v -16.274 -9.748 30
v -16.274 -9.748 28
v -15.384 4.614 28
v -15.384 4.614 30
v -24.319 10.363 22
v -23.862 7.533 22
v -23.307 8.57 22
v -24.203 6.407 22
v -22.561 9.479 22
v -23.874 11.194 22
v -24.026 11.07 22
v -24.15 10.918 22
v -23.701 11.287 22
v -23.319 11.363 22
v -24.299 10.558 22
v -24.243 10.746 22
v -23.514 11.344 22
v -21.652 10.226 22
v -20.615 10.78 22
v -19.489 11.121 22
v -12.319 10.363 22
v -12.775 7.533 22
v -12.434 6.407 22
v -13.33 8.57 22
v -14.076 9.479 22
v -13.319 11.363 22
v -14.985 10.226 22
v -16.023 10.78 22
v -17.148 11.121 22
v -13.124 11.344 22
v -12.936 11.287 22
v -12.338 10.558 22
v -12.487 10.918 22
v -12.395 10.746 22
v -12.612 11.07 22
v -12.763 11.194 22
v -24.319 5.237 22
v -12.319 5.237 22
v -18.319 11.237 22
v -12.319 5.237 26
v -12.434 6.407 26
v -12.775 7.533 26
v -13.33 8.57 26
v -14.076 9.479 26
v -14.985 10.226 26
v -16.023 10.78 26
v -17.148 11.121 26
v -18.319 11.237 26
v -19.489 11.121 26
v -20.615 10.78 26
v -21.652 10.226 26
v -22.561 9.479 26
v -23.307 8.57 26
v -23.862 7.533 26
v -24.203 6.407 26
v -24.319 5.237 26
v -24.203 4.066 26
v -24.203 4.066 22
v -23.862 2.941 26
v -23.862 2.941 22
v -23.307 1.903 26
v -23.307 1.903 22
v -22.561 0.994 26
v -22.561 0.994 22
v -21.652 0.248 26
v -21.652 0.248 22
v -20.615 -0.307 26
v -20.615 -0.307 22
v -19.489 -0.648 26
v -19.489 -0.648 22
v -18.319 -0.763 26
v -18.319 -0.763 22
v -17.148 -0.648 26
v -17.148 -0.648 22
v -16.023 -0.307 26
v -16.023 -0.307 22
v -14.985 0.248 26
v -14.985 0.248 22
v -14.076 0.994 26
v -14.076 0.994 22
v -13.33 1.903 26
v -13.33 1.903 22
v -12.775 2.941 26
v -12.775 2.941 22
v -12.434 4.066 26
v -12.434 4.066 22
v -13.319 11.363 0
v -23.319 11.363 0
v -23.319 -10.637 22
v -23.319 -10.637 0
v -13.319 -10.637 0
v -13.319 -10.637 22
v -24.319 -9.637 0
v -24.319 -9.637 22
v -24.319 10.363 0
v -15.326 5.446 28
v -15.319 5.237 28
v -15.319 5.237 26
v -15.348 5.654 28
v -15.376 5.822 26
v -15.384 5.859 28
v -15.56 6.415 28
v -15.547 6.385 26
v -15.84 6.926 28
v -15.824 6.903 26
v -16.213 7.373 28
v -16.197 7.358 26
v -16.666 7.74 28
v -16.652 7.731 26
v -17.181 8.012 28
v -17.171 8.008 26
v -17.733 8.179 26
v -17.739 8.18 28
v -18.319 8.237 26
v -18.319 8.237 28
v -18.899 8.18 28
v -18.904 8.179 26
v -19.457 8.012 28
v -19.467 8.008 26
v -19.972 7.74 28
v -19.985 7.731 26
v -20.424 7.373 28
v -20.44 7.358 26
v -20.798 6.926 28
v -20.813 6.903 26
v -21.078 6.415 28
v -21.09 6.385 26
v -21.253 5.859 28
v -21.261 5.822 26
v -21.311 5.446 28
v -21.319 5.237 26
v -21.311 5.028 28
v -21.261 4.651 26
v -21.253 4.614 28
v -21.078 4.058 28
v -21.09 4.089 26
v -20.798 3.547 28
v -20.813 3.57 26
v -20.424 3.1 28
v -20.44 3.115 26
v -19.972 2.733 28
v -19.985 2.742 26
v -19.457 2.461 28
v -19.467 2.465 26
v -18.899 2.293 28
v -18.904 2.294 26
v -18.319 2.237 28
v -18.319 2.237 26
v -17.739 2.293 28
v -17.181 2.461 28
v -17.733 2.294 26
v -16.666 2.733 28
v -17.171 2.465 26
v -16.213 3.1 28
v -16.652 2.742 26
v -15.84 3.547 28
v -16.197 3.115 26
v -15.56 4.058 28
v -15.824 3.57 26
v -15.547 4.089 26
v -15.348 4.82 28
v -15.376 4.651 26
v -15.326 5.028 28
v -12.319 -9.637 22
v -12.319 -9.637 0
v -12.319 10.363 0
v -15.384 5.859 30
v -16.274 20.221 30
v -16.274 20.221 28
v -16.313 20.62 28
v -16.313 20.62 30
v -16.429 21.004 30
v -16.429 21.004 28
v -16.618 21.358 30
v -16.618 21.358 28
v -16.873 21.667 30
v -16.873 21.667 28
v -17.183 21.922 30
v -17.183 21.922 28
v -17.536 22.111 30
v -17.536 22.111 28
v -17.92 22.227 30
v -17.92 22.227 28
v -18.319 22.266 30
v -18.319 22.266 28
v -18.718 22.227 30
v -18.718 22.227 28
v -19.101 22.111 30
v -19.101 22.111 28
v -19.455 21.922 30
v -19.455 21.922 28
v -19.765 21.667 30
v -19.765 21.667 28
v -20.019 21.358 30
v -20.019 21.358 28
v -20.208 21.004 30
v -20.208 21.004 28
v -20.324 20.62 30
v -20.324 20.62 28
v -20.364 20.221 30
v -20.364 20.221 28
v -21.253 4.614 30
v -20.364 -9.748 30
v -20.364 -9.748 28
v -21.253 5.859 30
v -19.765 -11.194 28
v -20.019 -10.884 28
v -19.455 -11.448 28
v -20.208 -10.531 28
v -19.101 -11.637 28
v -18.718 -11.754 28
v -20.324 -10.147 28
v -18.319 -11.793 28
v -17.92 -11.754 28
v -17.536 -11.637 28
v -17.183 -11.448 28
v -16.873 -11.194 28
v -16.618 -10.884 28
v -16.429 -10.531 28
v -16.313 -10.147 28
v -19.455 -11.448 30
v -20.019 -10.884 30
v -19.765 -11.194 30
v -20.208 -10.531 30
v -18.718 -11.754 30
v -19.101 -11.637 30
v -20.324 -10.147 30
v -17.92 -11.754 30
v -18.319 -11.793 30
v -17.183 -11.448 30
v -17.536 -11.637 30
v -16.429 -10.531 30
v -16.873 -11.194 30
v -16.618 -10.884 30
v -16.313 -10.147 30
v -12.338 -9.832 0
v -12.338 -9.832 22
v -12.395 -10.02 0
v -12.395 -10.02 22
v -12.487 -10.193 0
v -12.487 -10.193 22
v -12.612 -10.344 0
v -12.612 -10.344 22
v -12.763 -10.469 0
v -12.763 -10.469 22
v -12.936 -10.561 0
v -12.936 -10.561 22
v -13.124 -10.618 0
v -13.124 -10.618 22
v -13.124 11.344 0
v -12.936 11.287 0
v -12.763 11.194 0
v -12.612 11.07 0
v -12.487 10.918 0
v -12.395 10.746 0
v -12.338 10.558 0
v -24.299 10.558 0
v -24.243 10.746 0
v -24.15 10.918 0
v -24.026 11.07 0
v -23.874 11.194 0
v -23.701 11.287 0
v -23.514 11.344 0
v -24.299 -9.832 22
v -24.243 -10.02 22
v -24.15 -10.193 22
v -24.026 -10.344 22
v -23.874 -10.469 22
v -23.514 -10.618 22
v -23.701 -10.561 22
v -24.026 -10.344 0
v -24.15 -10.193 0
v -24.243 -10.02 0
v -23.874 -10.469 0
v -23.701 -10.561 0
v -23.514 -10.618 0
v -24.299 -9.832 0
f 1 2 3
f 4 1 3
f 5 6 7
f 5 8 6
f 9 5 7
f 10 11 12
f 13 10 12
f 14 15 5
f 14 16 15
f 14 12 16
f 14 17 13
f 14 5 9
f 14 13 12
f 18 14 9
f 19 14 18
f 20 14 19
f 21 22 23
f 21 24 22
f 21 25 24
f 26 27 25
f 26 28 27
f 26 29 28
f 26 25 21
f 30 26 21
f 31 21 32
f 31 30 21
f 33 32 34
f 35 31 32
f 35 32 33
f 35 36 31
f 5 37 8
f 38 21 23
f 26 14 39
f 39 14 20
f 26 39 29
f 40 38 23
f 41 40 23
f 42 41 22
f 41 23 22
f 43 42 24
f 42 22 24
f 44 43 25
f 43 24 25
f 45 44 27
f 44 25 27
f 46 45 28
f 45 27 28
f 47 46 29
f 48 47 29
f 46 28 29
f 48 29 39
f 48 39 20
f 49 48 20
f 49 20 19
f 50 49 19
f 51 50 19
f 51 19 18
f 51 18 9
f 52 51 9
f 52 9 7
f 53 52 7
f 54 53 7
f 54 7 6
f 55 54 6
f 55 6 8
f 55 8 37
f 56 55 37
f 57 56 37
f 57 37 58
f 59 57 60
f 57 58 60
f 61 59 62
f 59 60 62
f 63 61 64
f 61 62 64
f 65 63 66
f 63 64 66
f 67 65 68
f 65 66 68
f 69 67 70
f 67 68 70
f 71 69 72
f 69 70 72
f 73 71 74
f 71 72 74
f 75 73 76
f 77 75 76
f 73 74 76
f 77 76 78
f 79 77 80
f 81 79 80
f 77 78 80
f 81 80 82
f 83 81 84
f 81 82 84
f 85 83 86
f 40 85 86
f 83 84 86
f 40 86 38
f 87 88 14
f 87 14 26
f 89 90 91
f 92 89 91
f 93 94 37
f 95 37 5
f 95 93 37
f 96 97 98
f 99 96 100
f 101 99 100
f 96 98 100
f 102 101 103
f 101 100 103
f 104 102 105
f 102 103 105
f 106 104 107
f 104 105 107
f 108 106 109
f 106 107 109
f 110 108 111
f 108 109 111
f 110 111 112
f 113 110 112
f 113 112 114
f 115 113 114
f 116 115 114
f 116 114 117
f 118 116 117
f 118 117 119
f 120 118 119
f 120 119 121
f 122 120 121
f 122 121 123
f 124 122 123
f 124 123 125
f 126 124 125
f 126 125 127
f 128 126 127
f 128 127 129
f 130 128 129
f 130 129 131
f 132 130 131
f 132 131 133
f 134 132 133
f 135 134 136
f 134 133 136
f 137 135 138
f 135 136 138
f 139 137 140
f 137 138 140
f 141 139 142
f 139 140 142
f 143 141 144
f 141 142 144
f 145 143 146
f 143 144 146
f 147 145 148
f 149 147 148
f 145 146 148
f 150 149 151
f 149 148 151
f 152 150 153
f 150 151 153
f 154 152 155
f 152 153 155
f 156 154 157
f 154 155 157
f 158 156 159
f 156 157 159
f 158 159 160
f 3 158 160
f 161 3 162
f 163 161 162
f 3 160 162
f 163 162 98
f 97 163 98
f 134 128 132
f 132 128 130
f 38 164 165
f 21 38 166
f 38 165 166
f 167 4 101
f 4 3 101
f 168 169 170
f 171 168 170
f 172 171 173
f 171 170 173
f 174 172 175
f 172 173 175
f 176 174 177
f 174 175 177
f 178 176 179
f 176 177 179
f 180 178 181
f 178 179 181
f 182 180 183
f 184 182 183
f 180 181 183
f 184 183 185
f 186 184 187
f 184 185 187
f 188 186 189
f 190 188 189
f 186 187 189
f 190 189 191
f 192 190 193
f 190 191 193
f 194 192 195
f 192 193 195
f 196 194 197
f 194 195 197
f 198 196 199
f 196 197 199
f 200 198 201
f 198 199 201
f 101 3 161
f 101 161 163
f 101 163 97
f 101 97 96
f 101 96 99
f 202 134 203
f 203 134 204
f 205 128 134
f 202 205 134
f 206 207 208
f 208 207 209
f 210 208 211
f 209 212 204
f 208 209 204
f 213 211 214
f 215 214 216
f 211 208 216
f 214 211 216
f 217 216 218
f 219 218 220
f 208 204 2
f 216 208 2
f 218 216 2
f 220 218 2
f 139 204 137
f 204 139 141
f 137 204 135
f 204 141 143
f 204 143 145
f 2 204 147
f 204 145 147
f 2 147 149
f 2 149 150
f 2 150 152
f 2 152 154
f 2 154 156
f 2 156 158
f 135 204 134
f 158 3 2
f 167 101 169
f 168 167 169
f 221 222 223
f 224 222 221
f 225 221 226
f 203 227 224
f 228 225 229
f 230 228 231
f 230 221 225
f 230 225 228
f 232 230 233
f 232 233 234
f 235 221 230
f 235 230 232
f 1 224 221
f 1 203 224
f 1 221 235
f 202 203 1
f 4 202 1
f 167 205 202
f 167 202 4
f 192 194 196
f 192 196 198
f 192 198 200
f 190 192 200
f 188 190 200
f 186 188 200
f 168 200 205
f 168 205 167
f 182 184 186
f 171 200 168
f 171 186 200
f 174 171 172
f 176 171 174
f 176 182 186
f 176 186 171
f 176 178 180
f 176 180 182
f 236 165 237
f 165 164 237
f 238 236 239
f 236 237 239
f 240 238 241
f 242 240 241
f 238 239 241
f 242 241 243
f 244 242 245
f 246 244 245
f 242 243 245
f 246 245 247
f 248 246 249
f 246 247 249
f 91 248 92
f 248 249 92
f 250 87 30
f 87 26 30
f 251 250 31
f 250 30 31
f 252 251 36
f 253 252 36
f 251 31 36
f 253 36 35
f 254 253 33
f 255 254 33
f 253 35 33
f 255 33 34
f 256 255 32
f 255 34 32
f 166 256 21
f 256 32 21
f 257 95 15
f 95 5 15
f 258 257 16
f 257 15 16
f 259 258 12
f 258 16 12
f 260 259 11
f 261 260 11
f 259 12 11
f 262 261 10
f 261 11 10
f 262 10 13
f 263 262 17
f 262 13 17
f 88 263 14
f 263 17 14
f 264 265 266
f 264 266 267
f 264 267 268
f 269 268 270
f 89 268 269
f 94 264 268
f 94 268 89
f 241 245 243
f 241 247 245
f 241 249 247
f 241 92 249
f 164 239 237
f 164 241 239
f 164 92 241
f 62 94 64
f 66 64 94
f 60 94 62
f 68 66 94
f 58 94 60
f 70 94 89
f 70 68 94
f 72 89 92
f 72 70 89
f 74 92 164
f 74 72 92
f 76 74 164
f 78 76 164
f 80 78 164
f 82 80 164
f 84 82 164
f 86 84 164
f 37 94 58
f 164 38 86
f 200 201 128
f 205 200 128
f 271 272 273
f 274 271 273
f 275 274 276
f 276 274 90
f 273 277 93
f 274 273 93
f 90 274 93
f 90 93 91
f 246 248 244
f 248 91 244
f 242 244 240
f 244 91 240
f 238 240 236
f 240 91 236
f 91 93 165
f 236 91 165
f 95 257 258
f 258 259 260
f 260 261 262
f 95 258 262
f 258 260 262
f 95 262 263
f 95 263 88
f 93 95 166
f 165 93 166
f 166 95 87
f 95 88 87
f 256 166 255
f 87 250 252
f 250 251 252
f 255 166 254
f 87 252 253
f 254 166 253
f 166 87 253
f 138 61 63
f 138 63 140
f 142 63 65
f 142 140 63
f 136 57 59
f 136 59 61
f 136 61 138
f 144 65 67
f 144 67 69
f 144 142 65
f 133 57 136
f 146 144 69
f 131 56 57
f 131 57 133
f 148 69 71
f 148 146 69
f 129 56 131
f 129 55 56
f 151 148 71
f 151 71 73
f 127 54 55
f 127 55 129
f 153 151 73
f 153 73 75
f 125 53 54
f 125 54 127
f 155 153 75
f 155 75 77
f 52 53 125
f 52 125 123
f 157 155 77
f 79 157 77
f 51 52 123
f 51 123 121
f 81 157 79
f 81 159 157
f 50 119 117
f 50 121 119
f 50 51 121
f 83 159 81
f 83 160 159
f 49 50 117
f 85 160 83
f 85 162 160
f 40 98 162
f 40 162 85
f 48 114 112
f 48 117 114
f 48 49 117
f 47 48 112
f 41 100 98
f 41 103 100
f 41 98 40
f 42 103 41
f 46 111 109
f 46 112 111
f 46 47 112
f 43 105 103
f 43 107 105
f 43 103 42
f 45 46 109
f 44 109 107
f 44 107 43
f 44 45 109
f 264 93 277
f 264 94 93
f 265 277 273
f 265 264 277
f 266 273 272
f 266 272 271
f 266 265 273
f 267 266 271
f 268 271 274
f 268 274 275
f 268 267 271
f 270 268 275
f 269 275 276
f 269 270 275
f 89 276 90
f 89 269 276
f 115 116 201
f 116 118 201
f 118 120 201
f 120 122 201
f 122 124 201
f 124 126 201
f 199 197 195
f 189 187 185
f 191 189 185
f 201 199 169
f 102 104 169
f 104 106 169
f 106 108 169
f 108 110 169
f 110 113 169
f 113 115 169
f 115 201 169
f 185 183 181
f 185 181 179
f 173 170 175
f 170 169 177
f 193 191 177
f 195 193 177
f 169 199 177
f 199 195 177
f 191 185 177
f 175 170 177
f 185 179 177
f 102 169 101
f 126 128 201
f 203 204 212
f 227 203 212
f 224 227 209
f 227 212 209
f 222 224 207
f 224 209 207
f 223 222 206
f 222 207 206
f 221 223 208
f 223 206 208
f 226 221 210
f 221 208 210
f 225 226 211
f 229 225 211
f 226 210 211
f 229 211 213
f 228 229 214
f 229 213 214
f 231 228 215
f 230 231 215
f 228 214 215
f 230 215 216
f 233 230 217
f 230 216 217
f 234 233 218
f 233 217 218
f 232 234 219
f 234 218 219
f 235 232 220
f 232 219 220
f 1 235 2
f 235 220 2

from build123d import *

# Parameters (mm, degrees)
F0_W     = 12
F0_H     = 22
F1_DEPTH = 22
F3_DEPTH = 4
F4_R     = 3
F5_DEPTH = 2
F7_DEPTH = 2
F8_R     = 1


with BuildPart() as f1:
    # F0 (on Top) → F1 (new body)
    with BuildSketch(Plane.XY):
        with Locations((-18.318631, 0.362903)):
            Rectangle(F0_W, F0_H)
    extrude(amount=F1_DEPTH)

    # F2 (on face) → F3 (join)
    with BuildSketch(Plane.XY.offset(22)):
        with BuildLine():
            ThreePointArc((-24.318631, 5.236689), (-18.318631, -0.763311), (-12.318631, 5.236689))
            ThreePointArc((-12.318631, 5.236689), (-18.318631, 11.236689), (-24.318631, 5.236689))
        make_face()
    extrude(amount=F3_DEPTH)

    # F4 (on face) → F5 (join)
    with BuildSketch(Plane.XY.offset(26)):
        with Locations((-18.318631, 5.236689)):
            Circle(F4_R)
    extrude(amount=F5_DEPTH)

    # F6 (on face) → F7 (join)
    with BuildSketch(Plane.XY.offset(28)):
        with BuildLine():
            Line((-18.318631, 20.221412), (-16.273675, 20.221412))
            ThreePointArc((-16.273675, 20.221412), (-18.318631, 22.266367), (-20.363586, 20.221412))
            Line((-20.363586, 20.221412), (-18.318631, 20.221412))
        make_face()
        with BuildLine():
            Line((-18.318631, 20.221412), (-20.363586, 20.221412))
            Line((-20.363586, 20.221412), (-21.253275, 5.859475))
            ThreePointArc((-21.253275, 5.859475), (-20.206969, 7.567822), (-18.318631, 8.236689))
            Line((-18.318631, 8.236689), (-18.318631, 20.221412))
        make_face()
        with BuildLine():
            Line((-15.383986, 5.859475), (-16.273675, 20.221412))
            Line((-16.273675, 20.221412), (-18.318631, 20.221412))
            Line((-18.318631, 20.221412), (-18.318631, 8.236689))
            ThreePointArc((-18.318631, 8.236689), (-16.430293, 7.567822), (-15.383986, 5.859475))
        make_face()
        with BuildLine():
            Line((-15.383986, 4.613903), (-15.383986, 5.859475))
            ThreePointArc((-15.383986, 5.859475), (-16.430293, 7.567822), (-18.318631, 8.236689))
            ThreePointArc((-18.318631, 8.236689), (-20.206969, 7.567822), (-21.253275, 5.859475))
            Line((-21.253275, 5.859475), (-21.253275, 4.613903))
            ThreePointArc((-21.253275, 4.613903), (-18.318631, 2.236689), (-15.383986, 4.613903))
        make_face()
        with BuildLine():
            Line((-16.273675, -9.748033), (-15.383986, 4.613903))
            ThreePointArc((-15.383986, 4.613903), (-18.318631, 2.236689), (-21.253275, 4.613903))
            Line((-21.253275, 4.613903), (-20.363586, -9.748033))
            Line((-20.363586, -9.748033), (-18.318631, -9.748033))
            Line((-18.318631, -9.748033), (-16.273675, -9.748033))
        make_face()
        with BuildLine():
            ThreePointArc((-20.363586, -9.748033), (-18.318631, -11.792988), (-16.273675, -9.748033))
            Line((-16.273675, -9.748033), (-18.318631, -9.748033))
            Line((-18.318631, -9.748033), (-20.363586, -9.748033))
        make_face()
    extrude(amount=F7_DEPTH)

    # F8
    f8_edges = [f1.edges().sort_by_distance(p)[0] for p in [
        (-12.318631, 11.362903, 11),
        (-24.318631, 11.362903, 11),
        (-12.318631, -10.637097, 11),
        (-24.318631, -10.637097, 11),
    ]]
    fillet(f8_edges, radius=F8_R)


solid = f1.part
